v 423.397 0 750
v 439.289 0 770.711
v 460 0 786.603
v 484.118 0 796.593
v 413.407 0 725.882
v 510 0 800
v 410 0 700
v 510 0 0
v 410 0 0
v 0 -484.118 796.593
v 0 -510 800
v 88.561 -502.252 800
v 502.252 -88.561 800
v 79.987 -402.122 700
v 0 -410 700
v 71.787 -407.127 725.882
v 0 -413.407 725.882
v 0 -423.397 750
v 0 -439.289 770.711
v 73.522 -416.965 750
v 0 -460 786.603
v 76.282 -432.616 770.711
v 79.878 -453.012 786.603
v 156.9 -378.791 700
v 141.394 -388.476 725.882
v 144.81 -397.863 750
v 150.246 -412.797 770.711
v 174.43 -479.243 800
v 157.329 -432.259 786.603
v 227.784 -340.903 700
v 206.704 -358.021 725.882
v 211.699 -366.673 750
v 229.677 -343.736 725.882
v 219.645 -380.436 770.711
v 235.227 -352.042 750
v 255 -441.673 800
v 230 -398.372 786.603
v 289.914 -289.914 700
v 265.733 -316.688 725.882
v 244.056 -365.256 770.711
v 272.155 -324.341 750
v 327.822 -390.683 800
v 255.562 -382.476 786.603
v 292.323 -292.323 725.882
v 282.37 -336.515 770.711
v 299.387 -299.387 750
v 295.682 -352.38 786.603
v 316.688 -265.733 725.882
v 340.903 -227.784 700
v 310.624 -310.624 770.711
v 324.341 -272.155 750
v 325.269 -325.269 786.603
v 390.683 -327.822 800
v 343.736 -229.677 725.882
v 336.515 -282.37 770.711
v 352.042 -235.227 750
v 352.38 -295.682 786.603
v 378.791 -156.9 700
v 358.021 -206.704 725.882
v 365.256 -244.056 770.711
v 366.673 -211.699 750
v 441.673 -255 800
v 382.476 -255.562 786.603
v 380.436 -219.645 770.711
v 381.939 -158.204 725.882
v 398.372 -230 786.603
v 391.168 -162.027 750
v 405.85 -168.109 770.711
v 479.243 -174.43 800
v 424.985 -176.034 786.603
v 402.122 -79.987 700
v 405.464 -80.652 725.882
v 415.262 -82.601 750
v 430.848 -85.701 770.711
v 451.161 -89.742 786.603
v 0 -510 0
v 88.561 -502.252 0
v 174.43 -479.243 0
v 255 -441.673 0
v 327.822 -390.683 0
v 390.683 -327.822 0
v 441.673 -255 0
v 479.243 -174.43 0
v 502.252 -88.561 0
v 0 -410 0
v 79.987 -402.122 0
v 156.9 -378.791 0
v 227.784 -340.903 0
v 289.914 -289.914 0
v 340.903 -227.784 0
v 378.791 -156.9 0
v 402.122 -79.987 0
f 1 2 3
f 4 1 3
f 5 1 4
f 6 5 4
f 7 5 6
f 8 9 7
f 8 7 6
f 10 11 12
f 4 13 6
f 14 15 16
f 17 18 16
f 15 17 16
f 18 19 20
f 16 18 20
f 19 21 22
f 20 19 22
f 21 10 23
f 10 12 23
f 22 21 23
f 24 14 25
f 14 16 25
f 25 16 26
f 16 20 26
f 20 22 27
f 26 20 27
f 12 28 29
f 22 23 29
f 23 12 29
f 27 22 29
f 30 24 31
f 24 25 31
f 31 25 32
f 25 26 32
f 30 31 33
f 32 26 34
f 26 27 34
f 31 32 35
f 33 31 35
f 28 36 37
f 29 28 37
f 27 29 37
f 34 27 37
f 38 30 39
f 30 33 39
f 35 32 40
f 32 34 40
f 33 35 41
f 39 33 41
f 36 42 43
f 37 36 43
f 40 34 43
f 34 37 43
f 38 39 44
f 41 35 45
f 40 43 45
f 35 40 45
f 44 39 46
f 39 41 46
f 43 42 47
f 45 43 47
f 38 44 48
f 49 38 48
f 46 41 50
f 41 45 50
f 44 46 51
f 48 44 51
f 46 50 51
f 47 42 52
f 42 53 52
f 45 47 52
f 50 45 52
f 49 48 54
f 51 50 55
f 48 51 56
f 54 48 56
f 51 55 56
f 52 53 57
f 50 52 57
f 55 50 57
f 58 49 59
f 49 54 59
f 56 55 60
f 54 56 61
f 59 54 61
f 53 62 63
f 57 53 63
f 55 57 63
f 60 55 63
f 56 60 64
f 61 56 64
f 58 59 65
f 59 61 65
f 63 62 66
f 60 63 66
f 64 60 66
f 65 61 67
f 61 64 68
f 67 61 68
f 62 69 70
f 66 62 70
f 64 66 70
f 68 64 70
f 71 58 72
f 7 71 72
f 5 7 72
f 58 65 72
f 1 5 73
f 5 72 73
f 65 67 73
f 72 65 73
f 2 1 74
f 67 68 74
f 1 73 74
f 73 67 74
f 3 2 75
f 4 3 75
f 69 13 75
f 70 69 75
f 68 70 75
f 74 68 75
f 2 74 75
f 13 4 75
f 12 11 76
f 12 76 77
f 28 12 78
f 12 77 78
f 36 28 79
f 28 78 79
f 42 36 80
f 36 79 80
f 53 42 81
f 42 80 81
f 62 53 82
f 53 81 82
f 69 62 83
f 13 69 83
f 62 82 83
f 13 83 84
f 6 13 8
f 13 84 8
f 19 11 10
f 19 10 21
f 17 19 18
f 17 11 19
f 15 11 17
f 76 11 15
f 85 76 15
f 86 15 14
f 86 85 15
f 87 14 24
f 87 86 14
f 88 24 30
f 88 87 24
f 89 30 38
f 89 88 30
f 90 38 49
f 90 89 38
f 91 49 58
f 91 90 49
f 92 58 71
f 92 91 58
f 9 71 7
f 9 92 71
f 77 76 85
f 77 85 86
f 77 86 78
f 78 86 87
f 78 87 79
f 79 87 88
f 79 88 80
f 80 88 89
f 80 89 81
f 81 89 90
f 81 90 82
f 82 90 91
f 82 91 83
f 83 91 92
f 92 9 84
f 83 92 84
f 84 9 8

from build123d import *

# Parameters (mm, degrees)
SKETCH_1_R          = 510
SKETCH_1_R_2        = 410
EXTRUDE_1_DEPTH     = 800
FILLET_1_R          = 100
CUT_EXTRUDE_2_DEPTH = 800


with BuildPart() as part:
    # 草图1 → 凸台-拉伸1 (new body)
    with BuildSketch(Plane.XY):
        Circle(SKETCH_1_R)
        Circle(SKETCH_1_R_2, mode=Mode.SUBTRACT)
    extrude(amount=EXTRUDE_1_DEPTH)

    # 圆角1
    fillet_1_edges = [part.edges().sort_by_distance(p)[0] for p in [
        (-410, 0, 800),
    ]]
    fillet(fillet_1_edges, radius=FILLET_1_R - 0.0001)  # a hair under: the kernel refuses the full size

    # 草图2 → 切除-拉伸2 (cut)
    with BuildSketch(Plane.XY):
        Polygon((0, 764.183670641), (-976.361078065, 764.183670641), (-976.361078065, 0), (-976.361078065, -891.83511901), (0, -891.83511901), (0, 0), (1031.561704387, 0), (1031.561704387, 764.183670641), align=None)
    extrude(amount=CUT_EXTRUDE_2_DEPTH, mode=Mode.SUBTRACT)


solid = part.part
